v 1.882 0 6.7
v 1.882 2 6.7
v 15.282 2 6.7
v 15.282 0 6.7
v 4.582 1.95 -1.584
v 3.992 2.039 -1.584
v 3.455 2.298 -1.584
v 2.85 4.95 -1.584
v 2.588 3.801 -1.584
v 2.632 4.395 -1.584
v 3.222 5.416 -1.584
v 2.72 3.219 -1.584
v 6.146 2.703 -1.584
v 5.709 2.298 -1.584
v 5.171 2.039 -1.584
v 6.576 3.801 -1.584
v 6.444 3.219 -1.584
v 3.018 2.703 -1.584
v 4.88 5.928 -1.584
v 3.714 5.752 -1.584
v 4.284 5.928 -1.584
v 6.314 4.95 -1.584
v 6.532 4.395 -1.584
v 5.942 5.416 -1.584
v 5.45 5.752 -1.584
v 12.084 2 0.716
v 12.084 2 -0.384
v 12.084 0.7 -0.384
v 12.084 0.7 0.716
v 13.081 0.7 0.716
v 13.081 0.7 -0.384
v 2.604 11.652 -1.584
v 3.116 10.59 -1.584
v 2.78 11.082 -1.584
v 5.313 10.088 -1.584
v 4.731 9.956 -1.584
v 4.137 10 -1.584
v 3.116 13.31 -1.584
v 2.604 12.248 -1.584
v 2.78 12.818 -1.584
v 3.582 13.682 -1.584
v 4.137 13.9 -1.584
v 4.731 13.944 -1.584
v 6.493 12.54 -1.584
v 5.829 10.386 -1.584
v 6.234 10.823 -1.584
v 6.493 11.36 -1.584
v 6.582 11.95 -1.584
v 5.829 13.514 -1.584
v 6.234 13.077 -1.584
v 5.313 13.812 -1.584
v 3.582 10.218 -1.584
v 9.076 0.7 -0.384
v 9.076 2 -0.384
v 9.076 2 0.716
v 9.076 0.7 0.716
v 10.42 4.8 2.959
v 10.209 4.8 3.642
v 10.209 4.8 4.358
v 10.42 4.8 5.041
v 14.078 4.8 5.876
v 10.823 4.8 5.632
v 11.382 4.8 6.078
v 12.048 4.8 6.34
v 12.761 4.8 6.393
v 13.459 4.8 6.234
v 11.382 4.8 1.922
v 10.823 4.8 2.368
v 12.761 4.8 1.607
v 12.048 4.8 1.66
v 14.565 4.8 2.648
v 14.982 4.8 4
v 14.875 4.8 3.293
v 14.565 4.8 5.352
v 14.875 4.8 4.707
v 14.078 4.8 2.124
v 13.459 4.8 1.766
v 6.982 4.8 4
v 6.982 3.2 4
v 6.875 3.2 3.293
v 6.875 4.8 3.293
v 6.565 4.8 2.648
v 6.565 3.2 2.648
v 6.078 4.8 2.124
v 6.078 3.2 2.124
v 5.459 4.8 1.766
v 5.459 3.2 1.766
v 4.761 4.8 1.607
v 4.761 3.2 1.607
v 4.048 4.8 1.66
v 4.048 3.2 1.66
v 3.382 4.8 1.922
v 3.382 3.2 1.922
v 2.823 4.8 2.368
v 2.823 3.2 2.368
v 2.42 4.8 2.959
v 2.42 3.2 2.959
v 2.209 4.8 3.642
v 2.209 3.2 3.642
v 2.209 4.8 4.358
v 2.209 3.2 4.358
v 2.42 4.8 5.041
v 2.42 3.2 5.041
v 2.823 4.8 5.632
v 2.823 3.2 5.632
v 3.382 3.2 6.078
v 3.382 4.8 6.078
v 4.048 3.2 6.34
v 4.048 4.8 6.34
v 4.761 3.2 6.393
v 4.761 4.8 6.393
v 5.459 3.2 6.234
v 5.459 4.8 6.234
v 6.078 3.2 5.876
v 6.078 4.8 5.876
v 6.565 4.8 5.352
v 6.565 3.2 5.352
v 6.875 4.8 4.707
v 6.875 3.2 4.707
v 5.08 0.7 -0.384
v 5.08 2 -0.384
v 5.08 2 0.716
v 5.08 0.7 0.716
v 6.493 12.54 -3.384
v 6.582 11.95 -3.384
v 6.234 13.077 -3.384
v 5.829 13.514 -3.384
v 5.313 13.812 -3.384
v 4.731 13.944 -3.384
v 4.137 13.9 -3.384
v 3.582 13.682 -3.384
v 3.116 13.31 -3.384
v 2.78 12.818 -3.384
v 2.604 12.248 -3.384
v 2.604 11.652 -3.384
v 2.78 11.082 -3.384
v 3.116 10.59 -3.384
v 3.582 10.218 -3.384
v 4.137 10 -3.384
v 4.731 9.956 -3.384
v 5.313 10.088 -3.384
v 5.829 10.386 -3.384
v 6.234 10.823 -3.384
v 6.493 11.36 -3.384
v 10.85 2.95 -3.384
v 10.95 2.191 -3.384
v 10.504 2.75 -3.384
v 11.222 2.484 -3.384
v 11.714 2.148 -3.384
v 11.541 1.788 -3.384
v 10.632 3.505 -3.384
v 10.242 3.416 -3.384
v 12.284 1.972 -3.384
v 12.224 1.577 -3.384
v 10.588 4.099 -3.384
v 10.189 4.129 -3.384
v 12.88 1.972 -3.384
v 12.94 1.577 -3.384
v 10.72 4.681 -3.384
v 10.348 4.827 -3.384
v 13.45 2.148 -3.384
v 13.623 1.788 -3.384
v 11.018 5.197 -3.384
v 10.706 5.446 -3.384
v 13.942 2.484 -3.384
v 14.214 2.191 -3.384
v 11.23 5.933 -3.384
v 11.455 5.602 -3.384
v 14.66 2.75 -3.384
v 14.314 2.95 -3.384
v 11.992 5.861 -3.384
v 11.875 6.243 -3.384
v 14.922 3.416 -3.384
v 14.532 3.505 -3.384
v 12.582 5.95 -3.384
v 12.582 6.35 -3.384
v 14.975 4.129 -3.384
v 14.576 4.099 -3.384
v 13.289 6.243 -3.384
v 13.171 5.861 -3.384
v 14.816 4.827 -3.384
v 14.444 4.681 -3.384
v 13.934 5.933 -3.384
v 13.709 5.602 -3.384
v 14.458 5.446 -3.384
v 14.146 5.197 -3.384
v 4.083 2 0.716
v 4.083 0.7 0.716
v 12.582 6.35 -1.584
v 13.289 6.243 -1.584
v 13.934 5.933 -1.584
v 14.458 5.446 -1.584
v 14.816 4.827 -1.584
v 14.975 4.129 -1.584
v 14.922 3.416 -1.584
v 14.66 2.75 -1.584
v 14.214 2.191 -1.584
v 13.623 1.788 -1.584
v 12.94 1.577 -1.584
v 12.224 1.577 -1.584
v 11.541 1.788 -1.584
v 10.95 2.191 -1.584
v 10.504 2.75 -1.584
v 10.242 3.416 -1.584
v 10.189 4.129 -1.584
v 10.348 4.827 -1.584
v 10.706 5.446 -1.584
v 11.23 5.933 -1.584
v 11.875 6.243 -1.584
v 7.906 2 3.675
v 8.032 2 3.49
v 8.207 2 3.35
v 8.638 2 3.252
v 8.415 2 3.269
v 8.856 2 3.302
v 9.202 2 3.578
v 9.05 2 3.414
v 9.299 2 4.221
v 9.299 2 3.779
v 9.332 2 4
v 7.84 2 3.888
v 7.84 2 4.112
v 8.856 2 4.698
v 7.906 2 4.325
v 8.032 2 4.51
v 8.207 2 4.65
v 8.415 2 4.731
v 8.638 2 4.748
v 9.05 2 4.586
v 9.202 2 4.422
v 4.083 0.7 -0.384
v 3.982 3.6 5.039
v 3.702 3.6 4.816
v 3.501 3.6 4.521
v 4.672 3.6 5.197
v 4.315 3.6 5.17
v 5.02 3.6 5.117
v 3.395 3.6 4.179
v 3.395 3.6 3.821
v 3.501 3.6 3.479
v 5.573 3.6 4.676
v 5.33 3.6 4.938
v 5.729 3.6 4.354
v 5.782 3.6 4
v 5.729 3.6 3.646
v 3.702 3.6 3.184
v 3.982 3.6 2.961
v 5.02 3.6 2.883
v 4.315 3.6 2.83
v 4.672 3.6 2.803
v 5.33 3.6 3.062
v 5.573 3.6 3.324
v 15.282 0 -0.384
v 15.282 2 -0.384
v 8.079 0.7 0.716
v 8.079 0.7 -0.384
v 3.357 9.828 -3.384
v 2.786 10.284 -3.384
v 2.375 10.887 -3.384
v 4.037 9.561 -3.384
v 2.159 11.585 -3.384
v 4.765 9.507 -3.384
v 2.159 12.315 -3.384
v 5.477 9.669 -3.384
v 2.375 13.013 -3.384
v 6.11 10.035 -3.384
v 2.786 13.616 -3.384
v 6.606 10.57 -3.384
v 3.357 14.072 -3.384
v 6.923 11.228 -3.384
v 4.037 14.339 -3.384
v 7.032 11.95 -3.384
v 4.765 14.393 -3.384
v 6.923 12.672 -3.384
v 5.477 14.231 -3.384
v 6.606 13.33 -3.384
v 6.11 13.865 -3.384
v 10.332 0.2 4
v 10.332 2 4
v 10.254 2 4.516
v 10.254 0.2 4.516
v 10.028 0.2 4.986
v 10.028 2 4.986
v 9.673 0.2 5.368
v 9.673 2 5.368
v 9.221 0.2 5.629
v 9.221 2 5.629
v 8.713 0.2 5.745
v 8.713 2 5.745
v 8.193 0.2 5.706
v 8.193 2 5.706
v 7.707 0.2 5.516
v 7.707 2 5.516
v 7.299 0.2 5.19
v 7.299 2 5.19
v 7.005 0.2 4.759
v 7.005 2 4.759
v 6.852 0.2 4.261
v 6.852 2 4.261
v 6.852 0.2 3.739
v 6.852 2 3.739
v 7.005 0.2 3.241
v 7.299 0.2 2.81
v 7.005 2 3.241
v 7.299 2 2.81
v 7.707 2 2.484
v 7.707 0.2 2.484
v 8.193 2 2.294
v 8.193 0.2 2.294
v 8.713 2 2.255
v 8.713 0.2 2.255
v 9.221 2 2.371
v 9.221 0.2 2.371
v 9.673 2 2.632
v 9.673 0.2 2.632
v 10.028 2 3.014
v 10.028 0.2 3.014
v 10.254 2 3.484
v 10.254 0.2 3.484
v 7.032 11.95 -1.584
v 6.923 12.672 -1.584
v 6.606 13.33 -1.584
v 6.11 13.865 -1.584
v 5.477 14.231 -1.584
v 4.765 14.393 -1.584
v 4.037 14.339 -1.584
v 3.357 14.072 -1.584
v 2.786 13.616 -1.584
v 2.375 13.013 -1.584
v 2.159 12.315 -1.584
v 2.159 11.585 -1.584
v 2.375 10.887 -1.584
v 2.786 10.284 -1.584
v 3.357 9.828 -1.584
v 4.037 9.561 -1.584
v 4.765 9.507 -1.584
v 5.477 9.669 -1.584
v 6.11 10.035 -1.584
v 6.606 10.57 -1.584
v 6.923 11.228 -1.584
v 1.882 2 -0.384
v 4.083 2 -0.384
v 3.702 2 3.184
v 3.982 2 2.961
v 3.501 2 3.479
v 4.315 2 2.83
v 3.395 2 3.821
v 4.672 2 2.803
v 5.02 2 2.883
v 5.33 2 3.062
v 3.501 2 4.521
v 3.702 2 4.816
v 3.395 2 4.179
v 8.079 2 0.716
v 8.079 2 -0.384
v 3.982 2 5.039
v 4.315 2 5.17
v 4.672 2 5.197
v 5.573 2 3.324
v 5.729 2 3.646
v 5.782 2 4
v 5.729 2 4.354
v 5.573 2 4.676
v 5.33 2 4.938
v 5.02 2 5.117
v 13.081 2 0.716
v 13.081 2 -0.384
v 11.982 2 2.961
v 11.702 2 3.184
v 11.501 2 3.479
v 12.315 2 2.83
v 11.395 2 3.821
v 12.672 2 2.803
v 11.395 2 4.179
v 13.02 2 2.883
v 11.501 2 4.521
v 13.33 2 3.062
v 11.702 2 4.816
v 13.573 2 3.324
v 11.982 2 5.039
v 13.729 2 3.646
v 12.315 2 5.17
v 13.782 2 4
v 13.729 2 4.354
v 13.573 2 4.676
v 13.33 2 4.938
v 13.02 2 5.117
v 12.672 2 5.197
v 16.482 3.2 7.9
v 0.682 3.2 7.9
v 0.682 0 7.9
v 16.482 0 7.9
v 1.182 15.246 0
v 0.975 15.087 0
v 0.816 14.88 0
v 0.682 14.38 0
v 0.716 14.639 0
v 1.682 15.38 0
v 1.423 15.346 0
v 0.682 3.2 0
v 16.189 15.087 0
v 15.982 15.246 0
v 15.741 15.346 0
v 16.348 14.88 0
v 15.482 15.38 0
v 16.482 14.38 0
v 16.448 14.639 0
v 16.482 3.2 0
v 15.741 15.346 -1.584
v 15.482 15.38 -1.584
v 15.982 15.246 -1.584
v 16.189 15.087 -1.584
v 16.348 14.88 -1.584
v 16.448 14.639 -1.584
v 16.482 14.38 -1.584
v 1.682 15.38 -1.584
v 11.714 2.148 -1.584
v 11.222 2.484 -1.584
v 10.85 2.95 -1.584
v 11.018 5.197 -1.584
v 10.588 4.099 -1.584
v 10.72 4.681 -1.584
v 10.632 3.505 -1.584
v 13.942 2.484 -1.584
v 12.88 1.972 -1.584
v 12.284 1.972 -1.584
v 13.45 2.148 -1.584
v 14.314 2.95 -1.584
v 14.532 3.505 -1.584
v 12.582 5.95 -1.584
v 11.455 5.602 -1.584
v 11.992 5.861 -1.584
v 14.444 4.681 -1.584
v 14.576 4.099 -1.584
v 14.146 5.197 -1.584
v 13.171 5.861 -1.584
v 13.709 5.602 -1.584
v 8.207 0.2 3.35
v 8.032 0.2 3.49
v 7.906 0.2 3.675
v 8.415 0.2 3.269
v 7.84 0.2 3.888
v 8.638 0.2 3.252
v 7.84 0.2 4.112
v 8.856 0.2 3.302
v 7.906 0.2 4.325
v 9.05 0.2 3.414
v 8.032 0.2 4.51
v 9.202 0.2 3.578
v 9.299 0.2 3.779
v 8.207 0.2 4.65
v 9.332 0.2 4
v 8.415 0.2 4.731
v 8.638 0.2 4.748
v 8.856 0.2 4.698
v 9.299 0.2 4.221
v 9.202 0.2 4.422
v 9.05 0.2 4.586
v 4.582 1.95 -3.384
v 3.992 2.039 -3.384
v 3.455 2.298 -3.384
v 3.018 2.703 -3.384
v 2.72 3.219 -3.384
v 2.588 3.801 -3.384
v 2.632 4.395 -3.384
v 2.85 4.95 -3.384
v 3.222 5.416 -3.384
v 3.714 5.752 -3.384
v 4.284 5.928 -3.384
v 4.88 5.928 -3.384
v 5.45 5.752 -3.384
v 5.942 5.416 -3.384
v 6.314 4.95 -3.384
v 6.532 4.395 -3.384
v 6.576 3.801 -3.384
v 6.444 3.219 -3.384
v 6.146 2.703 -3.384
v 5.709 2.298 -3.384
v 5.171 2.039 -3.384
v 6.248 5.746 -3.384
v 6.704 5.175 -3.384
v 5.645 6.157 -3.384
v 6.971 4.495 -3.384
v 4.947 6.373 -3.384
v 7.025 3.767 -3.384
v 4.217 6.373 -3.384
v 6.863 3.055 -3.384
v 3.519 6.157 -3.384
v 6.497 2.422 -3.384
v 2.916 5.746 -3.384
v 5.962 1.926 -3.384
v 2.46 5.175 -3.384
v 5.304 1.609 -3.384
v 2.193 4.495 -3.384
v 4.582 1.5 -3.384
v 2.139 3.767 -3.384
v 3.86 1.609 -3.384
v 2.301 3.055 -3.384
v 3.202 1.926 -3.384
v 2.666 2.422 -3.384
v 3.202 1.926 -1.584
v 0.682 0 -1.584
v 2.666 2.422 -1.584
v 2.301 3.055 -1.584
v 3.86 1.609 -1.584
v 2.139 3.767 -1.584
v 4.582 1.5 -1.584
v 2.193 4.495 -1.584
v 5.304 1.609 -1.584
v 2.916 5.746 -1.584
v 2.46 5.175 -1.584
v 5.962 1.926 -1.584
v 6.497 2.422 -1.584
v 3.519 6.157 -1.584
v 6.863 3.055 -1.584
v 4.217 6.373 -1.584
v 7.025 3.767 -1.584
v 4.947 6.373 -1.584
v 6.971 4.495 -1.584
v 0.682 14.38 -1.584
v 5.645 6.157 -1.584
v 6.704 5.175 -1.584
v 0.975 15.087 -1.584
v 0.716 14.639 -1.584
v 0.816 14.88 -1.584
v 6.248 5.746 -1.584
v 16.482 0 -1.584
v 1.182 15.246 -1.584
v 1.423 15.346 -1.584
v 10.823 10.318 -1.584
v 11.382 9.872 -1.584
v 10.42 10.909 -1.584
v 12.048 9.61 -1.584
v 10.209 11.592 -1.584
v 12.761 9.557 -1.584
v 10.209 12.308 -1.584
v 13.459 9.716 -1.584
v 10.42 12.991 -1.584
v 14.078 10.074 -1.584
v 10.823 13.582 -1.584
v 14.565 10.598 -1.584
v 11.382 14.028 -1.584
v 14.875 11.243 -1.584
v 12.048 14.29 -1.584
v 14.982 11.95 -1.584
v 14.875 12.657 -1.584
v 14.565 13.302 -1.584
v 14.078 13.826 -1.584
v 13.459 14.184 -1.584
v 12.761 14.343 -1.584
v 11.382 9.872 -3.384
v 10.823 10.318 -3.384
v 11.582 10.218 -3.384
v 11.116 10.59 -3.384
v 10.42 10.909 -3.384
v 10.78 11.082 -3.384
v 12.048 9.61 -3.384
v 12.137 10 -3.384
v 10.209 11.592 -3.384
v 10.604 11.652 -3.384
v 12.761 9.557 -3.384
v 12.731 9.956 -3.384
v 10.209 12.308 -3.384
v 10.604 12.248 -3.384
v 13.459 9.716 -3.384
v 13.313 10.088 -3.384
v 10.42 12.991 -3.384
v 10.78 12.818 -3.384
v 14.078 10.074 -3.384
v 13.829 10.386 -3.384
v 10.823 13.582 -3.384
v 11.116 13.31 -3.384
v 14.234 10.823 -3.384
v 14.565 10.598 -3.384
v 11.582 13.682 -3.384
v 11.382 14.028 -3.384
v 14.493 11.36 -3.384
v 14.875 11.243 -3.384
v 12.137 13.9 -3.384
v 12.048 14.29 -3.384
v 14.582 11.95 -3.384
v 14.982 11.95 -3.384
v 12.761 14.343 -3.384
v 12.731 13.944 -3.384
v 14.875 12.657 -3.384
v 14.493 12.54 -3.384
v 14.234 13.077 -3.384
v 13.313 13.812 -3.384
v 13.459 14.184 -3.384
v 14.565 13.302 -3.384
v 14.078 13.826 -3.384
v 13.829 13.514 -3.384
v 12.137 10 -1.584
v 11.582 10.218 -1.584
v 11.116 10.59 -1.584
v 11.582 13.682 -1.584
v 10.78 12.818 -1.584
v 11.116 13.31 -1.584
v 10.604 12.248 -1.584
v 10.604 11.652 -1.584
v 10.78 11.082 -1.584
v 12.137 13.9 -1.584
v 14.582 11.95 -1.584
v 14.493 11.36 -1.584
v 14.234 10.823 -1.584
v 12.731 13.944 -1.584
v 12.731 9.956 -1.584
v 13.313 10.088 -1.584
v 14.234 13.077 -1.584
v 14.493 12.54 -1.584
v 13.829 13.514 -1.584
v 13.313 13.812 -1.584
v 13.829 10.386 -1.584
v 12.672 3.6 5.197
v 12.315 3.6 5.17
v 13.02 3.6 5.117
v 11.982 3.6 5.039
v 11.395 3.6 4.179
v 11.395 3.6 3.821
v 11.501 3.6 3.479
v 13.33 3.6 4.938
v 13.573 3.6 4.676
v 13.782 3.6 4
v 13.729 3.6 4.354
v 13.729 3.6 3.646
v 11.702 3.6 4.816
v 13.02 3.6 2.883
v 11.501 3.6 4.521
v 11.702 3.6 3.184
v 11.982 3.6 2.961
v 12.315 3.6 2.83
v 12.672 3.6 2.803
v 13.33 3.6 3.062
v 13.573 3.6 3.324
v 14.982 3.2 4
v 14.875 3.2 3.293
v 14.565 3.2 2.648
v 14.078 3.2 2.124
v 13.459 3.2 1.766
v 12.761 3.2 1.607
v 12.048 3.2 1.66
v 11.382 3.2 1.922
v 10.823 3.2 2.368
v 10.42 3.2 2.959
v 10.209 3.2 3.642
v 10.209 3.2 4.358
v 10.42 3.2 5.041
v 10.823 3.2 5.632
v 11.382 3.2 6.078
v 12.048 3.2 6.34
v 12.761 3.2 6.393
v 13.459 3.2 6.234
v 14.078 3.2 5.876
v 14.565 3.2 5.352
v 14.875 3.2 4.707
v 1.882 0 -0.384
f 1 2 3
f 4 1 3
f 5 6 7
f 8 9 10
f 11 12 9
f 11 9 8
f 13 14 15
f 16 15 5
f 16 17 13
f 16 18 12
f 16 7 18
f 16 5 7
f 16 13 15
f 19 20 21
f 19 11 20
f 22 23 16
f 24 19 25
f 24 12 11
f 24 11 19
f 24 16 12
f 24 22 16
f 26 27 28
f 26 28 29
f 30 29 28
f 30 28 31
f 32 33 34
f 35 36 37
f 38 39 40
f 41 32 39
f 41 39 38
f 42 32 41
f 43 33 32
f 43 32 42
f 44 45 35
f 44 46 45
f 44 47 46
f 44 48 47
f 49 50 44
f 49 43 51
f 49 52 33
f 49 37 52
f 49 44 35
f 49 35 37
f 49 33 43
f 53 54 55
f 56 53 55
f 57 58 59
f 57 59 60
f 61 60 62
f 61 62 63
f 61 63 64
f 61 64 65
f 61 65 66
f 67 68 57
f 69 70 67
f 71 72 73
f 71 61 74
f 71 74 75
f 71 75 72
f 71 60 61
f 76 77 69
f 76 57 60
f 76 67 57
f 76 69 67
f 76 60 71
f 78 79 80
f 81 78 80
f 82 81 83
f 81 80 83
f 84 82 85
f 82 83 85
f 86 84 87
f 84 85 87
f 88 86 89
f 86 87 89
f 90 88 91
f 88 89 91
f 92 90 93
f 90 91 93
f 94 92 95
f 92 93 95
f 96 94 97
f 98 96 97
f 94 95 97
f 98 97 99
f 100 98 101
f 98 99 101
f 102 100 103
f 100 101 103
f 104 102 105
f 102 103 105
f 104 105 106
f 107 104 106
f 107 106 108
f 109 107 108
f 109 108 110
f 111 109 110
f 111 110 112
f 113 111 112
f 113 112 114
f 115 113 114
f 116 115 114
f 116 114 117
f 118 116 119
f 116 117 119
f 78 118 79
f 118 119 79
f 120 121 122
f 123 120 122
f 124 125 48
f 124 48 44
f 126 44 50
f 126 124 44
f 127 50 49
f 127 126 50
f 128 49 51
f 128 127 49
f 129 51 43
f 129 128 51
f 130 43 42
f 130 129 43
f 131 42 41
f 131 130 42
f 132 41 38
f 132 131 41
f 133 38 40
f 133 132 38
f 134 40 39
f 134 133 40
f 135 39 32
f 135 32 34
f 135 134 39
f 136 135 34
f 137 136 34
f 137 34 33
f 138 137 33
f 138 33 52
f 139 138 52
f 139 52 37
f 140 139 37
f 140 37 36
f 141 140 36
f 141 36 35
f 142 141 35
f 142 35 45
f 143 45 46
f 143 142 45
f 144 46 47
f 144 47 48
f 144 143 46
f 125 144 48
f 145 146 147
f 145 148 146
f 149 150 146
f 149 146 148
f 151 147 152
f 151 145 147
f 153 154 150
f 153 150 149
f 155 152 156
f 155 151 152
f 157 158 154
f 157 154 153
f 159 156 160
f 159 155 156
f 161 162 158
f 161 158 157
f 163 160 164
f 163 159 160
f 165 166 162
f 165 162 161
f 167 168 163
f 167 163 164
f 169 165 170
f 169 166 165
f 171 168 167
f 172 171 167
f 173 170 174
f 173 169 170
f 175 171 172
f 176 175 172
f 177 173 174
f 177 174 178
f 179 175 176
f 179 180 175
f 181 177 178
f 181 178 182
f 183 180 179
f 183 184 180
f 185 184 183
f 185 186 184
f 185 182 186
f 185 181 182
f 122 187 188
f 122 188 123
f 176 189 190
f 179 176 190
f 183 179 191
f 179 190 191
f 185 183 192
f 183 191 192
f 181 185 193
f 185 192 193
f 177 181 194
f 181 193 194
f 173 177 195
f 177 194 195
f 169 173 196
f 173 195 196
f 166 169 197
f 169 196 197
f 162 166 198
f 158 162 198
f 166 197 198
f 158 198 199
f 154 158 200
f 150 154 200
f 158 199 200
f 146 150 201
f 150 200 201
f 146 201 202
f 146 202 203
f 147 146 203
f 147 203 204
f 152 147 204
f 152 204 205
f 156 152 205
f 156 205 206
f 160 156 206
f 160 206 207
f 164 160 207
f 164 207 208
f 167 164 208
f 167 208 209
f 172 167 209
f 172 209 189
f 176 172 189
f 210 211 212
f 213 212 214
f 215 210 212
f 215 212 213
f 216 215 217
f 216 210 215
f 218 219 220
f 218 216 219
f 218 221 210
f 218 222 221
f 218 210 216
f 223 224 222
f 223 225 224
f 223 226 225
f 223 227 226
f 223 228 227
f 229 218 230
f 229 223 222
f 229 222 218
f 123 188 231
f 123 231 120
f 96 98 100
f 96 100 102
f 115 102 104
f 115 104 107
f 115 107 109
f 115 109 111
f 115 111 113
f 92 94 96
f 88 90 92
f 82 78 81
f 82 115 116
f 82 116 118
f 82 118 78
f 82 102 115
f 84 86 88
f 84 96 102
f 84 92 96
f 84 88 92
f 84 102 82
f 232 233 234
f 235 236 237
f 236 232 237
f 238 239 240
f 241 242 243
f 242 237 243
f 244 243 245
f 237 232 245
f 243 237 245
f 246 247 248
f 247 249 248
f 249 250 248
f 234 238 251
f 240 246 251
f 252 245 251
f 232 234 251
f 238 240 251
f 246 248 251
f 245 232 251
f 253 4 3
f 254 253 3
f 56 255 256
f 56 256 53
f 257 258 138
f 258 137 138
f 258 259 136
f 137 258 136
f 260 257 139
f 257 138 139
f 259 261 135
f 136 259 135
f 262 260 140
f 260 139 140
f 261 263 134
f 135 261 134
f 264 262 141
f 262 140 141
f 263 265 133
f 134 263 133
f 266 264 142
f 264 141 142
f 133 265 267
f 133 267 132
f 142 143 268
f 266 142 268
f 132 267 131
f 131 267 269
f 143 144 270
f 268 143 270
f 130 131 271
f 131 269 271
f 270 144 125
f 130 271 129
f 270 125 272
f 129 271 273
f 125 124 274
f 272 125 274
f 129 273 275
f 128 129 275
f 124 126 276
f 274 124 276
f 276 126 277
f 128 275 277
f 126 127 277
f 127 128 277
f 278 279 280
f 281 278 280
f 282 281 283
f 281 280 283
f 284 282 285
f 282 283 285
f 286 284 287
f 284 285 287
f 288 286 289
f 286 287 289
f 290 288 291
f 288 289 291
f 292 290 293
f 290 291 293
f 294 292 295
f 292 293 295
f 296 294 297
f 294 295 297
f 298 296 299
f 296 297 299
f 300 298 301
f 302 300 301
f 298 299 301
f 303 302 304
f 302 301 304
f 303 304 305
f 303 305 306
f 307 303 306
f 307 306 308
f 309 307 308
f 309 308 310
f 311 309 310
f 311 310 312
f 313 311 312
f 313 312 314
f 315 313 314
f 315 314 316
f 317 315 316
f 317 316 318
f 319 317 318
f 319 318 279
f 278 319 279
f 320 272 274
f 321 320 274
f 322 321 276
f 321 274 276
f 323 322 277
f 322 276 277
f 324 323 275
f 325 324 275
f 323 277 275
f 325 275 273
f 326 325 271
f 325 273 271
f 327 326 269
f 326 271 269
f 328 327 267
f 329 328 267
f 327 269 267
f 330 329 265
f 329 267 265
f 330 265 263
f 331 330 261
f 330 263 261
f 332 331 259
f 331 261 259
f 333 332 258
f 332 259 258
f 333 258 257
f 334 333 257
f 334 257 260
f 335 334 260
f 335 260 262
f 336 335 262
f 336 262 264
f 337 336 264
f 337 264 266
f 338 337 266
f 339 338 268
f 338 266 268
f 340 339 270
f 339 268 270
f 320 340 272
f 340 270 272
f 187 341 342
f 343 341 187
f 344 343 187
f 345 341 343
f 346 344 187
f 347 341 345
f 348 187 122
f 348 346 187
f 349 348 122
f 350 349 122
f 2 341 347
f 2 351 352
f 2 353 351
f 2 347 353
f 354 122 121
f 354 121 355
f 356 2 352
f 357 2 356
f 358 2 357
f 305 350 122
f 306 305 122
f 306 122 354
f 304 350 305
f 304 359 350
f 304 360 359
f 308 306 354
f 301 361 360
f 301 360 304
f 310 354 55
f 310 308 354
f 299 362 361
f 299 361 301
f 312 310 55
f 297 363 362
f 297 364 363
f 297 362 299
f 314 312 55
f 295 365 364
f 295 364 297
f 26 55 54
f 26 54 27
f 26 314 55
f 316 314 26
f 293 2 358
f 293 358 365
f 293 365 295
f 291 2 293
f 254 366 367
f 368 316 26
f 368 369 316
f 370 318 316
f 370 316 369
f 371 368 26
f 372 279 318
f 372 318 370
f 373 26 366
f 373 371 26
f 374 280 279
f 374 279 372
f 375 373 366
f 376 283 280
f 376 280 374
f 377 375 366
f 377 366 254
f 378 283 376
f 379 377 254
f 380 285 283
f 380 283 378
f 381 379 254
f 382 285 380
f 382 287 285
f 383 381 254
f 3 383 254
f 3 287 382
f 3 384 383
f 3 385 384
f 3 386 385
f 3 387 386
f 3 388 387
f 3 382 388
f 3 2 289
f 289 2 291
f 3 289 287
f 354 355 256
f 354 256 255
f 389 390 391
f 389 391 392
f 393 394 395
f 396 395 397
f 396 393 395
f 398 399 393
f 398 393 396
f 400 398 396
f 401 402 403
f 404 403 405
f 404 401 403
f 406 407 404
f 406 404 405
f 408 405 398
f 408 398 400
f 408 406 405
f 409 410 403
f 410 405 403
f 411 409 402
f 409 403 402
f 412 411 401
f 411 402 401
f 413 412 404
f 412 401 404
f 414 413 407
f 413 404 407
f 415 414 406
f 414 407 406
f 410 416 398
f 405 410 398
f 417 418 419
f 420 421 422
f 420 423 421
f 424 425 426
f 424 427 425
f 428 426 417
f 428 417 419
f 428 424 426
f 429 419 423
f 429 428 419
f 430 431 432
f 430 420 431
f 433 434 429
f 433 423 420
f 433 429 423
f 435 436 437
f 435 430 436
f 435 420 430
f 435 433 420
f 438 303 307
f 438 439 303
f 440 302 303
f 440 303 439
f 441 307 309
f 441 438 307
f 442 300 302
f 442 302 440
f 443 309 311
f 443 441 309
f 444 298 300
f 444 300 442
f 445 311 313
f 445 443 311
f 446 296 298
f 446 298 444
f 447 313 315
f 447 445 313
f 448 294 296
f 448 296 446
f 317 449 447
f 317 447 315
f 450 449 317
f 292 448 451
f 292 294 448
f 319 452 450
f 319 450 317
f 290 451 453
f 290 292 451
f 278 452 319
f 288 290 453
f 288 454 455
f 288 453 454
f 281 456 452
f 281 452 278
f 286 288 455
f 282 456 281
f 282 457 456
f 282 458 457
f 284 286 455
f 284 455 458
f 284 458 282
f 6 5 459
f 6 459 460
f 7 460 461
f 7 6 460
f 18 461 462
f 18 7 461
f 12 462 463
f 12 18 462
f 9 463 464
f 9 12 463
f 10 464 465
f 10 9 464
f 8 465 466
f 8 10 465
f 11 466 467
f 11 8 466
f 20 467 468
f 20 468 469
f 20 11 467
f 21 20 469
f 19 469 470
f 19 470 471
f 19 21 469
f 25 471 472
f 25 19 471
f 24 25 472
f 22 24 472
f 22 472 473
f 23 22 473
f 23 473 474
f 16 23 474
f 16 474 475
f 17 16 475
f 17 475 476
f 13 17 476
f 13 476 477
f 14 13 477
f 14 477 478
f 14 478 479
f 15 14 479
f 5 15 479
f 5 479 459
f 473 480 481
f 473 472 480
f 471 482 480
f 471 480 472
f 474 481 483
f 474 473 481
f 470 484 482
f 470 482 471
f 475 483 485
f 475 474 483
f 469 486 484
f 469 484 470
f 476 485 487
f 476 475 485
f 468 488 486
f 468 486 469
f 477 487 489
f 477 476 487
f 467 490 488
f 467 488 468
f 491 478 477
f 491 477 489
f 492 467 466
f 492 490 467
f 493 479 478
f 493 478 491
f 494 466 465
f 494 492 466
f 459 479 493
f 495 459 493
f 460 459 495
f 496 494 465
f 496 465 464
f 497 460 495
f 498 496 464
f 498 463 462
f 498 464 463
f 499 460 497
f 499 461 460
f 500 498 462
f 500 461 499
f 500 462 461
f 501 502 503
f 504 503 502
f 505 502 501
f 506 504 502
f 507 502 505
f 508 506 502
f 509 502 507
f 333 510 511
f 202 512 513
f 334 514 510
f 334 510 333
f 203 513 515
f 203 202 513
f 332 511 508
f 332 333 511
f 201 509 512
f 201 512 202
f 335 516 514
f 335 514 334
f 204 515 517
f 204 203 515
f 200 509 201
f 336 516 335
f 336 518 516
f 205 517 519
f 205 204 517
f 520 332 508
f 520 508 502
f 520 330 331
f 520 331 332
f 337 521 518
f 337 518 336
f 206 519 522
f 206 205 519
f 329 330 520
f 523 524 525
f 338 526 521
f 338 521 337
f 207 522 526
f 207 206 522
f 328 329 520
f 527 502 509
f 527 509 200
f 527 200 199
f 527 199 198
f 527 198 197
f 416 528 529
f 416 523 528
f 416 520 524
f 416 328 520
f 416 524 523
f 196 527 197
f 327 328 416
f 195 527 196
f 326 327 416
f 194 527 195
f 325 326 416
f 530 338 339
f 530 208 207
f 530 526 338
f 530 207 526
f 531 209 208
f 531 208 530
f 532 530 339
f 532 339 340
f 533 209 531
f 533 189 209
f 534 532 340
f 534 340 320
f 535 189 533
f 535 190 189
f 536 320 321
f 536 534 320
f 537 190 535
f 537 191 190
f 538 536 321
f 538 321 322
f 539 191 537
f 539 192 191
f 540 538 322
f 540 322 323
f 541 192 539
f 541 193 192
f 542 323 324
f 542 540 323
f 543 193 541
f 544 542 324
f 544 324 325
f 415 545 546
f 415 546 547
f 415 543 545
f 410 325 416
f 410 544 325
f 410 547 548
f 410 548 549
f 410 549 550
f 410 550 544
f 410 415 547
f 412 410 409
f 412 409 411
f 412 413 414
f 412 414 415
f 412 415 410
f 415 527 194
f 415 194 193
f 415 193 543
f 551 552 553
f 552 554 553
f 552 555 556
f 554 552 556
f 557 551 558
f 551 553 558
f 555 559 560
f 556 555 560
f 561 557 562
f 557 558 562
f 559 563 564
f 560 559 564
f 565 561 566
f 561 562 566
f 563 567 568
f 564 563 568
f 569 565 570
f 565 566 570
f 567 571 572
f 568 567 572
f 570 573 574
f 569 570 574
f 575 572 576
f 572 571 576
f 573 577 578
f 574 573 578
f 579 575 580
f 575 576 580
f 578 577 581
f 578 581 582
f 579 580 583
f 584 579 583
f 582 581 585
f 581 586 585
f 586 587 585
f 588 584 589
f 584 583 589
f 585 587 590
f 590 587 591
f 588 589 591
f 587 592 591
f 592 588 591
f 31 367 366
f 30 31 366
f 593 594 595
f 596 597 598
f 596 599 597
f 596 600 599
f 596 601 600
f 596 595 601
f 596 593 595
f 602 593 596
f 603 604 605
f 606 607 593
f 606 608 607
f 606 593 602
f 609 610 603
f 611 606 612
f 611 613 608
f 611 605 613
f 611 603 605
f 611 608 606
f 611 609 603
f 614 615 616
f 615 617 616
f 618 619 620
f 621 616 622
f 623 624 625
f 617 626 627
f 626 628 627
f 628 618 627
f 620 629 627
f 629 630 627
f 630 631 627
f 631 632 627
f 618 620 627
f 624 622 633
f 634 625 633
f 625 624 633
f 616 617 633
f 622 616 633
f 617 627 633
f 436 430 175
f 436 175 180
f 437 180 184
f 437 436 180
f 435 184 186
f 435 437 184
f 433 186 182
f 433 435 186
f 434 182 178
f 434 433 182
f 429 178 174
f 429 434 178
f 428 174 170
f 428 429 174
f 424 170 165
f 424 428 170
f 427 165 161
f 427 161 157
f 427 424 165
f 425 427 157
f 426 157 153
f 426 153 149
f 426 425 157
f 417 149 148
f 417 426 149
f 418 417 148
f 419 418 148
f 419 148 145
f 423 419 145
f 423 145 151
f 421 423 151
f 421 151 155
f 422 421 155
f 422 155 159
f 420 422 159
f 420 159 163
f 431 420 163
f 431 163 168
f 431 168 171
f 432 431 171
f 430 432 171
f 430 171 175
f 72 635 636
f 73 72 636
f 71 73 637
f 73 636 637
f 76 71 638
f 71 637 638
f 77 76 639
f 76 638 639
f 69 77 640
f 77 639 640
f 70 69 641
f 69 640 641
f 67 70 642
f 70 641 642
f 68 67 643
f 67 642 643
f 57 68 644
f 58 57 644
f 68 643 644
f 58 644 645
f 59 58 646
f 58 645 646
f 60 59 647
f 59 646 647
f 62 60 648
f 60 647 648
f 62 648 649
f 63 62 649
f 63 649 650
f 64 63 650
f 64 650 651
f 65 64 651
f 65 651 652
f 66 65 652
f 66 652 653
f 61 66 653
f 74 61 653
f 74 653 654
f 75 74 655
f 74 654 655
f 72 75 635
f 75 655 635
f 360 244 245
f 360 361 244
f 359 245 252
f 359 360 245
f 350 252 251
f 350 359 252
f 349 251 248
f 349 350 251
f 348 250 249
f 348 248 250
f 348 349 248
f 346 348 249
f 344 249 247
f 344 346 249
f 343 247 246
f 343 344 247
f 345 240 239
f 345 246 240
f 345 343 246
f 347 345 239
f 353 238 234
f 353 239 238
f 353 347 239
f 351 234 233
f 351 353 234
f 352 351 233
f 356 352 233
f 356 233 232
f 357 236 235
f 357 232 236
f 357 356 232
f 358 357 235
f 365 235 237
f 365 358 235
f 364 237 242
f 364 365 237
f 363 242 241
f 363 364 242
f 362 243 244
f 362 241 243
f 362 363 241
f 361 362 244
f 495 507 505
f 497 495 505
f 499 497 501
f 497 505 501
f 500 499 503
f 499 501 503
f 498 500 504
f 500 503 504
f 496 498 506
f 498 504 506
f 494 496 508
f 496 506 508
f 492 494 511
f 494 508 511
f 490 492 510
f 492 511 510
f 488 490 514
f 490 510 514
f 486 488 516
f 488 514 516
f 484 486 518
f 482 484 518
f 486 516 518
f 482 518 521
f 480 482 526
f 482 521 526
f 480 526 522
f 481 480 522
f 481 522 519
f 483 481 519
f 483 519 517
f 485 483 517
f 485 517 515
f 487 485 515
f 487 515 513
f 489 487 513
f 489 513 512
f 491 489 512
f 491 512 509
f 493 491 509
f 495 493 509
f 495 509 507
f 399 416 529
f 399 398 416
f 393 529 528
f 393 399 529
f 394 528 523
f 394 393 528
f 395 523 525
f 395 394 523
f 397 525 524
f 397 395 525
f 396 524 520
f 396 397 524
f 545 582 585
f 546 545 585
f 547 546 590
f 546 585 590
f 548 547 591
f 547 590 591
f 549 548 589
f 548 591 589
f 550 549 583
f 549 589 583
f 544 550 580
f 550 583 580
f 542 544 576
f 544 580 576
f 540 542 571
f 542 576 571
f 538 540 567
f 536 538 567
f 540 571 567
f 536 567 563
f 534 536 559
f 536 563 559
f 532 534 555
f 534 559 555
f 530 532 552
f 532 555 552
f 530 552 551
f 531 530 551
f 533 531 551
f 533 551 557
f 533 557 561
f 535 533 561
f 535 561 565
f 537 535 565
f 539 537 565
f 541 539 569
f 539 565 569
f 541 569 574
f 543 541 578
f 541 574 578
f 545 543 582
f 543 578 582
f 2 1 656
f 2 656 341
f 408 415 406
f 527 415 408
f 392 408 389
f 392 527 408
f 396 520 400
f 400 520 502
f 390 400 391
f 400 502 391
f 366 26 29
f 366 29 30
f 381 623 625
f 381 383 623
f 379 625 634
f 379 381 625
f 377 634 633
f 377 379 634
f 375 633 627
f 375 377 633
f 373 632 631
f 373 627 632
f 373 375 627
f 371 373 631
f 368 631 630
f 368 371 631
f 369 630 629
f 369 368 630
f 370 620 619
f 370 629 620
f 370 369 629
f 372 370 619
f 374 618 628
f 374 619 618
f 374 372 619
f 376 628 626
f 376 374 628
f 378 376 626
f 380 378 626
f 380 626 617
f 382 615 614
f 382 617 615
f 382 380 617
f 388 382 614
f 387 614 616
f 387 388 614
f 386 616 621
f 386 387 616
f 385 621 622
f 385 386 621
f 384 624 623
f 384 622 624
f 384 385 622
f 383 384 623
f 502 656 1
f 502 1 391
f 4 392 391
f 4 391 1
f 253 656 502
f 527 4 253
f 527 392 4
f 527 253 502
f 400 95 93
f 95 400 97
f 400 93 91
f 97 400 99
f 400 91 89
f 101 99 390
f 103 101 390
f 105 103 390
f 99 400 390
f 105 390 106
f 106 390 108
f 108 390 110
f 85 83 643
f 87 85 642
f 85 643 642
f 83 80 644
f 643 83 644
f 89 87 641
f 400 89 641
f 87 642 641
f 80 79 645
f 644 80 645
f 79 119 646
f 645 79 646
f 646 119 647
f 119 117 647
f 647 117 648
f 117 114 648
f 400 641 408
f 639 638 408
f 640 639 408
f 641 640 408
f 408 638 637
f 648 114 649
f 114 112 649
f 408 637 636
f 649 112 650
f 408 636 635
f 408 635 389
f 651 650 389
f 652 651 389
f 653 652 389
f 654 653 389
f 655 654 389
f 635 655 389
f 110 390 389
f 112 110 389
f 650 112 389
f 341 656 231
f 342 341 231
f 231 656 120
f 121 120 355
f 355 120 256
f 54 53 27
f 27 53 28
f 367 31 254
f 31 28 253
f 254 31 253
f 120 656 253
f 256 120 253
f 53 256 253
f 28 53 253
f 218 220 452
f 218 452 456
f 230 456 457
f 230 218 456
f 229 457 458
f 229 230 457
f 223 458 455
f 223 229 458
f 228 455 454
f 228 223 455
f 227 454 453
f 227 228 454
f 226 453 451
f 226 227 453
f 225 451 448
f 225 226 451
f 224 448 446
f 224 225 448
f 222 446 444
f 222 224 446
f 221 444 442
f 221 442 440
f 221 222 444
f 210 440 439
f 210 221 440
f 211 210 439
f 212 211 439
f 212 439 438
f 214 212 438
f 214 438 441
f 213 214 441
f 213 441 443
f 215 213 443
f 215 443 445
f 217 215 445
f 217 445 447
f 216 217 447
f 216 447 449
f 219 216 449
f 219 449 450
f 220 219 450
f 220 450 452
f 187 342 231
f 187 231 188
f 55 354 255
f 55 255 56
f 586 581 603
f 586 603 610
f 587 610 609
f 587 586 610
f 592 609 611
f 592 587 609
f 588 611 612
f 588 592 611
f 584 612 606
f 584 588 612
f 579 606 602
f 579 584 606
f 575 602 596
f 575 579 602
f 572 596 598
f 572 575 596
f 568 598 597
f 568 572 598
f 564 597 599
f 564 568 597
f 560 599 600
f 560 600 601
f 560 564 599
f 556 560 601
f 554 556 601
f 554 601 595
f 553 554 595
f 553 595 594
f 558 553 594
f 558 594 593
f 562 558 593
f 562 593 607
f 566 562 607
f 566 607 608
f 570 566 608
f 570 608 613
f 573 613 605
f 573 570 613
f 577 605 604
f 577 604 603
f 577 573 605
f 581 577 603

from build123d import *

# Parameters (mm, degrees)
MAINBASESKETCH_W                       = 15.8
MAINBASESKETCH_H                       = 3.2
MAINBASEEXTRUDE_DEPTH                  = 7.9
STUDSSKETCH_R                          = 2.4
STUDSEXTRUDE_DEPTH                     = 1.6
STUDSPATTERN_COUNT                     = 2
STUDSPATTERN_PITCH                     = 8
STUDSPATTERN_COUNT_DIR2                = 2
STUDSPATTERN_PITCH_DIR2                = 8
MAINBASESHELL_T                        = -1.2
LCUTBLUE_DEPTH                         = 19.555463972
LCUTBLUE_DEPTH_BACK                    = 19.555463972
CUTADDEDTOLCUT_DEPTH                   = 2
MADESLIMCUTSKETCH_W                    = 7.9
MADESLIMCUTSKETCH_H                    = 7.9
MADESLIMCUT_DEPTH                      = 19.897228453
MADESLIMFILLEXT_REACH                  = 20.897
SKETCH33_W                             = 5.500952983
SKETCH33_H                             = 1.199047018
SLIMHOLEEXT_START                      = -0.2
SLIMHOLESKETCH_R                       = 1.75
SLIMHOLESKETCH_R_2                     = 0.75
SLIMHOLEEXT_DEPTH                      = 2
SHORTLEXTENSIONSKETCH_W                = 1.583745828
SHORTLEXTENSIONSKETCH_H                = 7.9
SHORTLEXTENDEDCUTSKETCH_W              = 13.4
SHORTLEXTENDEDCUTSKETCH_H              = 1.582792846
SHORTLEXTENDEDCUT_DEPTH                = 2
SHORTLUNDERSTUMPS_START                = -0.2
SHORTLUNDERSTUMPSKETCH_W               = 0.996828098
SHORTLUNDERSTUMPSKETCH_H               = 1.1
SHORTLUNDERSTUMPS_DEPTH                = 1.5
SHORTLUPPERCIRCLES_START               = -0.2
SHORTLUPPERCIRCLESSKETCH_R             = 2.4
SHORTLUPPERCIRCLESSKETCH_R_2           = 2
SHORTLUPPERCIRCLESSKETCH_R_3           = 2.45
SHORTLUPPERCIRCLES_DEPTH               = 2
TALLERLBASEEXTENSIONSKETCH_W           = 1.583745828
TALLERLBASEEXTENSIONSKETCH_H           = 7.48
F_4UPPERCIRCLESTALLERLBASE_START       = -3.383745828
F_4UPPERCIRCLESTALLERLBASE_OUTLINE_R   = 2.45
F_4UPPERCIRCLESTALLERLBASE_OUTLINE_R_2 = 2
F_4UPPERCIRCLESTALLERLBASE_OUTLINE_R_3 = 2.4
F_4UPPERCIRCLESTALLERLBASE_DEPTH       = 1.8
TALLERLBASEOUTERCHAMFER_R              = 1


# Read off the part's stored shape, not the designer's step: 4UpperCirclesTallerLBase
with BuildPart() as part:
    # MainBaseSketch → MainBaseExtrude (new, symmetric)
    with BuildSketch(Plane.XY):
        with Locations((8.581967213, 1.6)):
            Rectangle(MAINBASESKETCH_W, MAINBASESKETCH_H)
    extrude(amount=MAINBASEEXTRUDE_DEPTH, both=True)

    # StudsSketch → StudsExtrude (add)
    with BuildSketch(Plane(origin=(0, 3.2, 0), x_dir=(1, 0, 0), z_dir=(0, 1, 0))):
        with Locations((4.581967213, 4)):
            Circle(STUDSSKETCH_R)
    studsextrude = extrude(amount=STUDSEXTRUDE_DEPTH)

    # StudsPattern: StudsExtrude 2 × 2
    with Locations(*[(j * STUDSPATTERN_PITCH_DIR2, 0, i * STUDSPATTERN_PITCH) for i in range(STUDSPATTERN_COUNT) for j in range(STUDSPATTERN_COUNT_DIR2) if (i, j) != (0, 0)]):
        add(studsextrude)

    # MainBaseShell
    mainbaseshell_openings = [part.faces().sort_by_distance(p)[0] for p in [
        (8.581967213, 0, 0),
    ]]
    offset(amount=MAINBASESHELL_T, openings=mainbaseshell_openings, kind=Kind.INTERSECTION)

    # LCUTBlueSketch → LCutBlue (cut, two sides: drawn at the far end of the back side and taken through both)
    with BuildSketch(Plane(origin=(0, 3.2, 0), x_dir=(1, 0, 0), z_dir=(0, 1, 0)).offset(-LCUTBLUE_DEPTH_BACK)):
        Polygon((8.581967213, 53.229874044), (8.581967213, 7.9), (8.581967213, 0), (16.481967213, 0), (61.811841258, 0), (125.917963912, 64.106122654), (72.688089868, 117.335996699), align=None)
    extrude(amount=LCUTBLUE_DEPTH + LCUTBLUE_DEPTH_BACK, mode=Mode.SUBTRACT)

    # CutAddedtoLSketch → CutAddedToLCut (add)
    with BuildSketch(Plane.XZ):
        Polygon((7.382920196, -6.7), (8.581967213, -6.7), (8.581967213, 0), (15.281967213, 0), (15.281967213, 1.199047018), (7.382920196, 1.199047018), (7.382920196, 0), align=None)
    extrude(amount=-CUTADDEDTOLCUT_DEPTH)

    # MadeSlimCutSketch → MadeSlimCut (cut, through all)
    with BuildSketch(Plane.XZ):
        with Locations((4.631967213, -3.95)):
            Rectangle(MADESLIMCUTSKETCH_W, MADESLIMCUTSKETCH_H)
    extrude(amount=-MADESLIMCUT_DEPTH, mode=Mode.SUBTRACT)

    # Sketch33 → MadeSlimFillExt (add, up to next)
    with BuildSketch(Plane.XZ, mode=Mode.PRIVATE) as madeslimfillext_sk1:
        with Locations((4.632443704, 0.599523509)):
            Rectangle(SKETCH33_W, SKETCH33_H)
    madeslimfillext_tool1 = extrude(madeslimfillext_sk1.sketch, amount=-MADESLIMFILLEXT_REACH, mode=Mode.PRIVATE) - part.part
    add(madeslimfillext_tool1.solids().sort_by_distance((4.632444, 0, 0.599524))[0])

    # SlimHoleSketch → SlimHoleExt (add)
    with BuildSketch(Plane.XZ.offset(-2).offset(SLIMHOLEEXT_START)):
        with Locations((8.581967213, 4)):
            Circle(SLIMHOLESKETCH_R)
        with Locations((8.581967213, 4)):
            Circle(SLIMHOLESKETCH_R_2, mode=Mode.SUBTRACT)
    extrude(amount=SLIMHOLEEXT_DEPTH)

    # ShortLExtension: sweep along a curve in space
    with BuildLine() as shortlextension_path:
        Line((0.681967213, 3.2, 0), (16.481967213, 3.2, 0))
    # ShortLExtensionSketch → ShortLExtension (sweep)
    with BuildSketch(Plane(origin=(16.481967213, 0, 0), x_dir=(0, 0, -1), z_dir=(1, 0, 0))):
        with Locations((0.791872914, 3.95)):
            Rectangle(SHORTLEXTENSIONSKETCH_W, SHORTLEXTENSIONSKETCH_H)
    sweep(path=shortlextension_path.line)

    # ShortLExtendedCutSketch → ShortLExtendedCut (cut)
    with BuildSketch(Plane.XZ):
        with Locations((8.581967213, 0.407650595)):
            Rectangle(SHORTLEXTENDEDCUTSKETCH_W, SHORTLEXTENDEDCUTSKETCH_H)
    extrude(amount=-SHORTLEXTENDEDCUT_DEPTH, mode=Mode.SUBTRACT)

    # ShortLUnderStumpSketch → ShortLUnderStumps (add)
    with BuildSketch(Plane.XZ.offset(-2).offset(SHORTLUNDERSTUMPS_START)):
        with Locations((4.581764801, 0.166254172)):
            Rectangle(SHORTLUNDERSTUMPSKETCH_W, SHORTLUNDERSTUMPSKETCH_H)
        with Locations((8.57767054, 0.166254172)):
            Rectangle(SHORTLUNDERSTUMPSKETCH_W, SHORTLUNDERSTUMPSKETCH_H)
        with Locations((12.582169625, 0.166254172)):
            Rectangle(SHORTLUNDERSTUMPSKETCH_W, SHORTLUNDERSTUMPSKETCH_H)
    extrude(amount=SHORTLUNDERSTUMPS_DEPTH)

    # ShortLUpperCirclesSketch → ShortLUpperCircles (add)
    # profile 1 of 2: a face of its own
    with BuildSketch(Plane(origin=(0, 0, -1.583745828), x_dir=(-1, 0, 0), z_dir=(0, 0, -1)).offset(SHORTLUPPERCIRCLES_START)):
        with Locations(Location((-12.581967213, 3.95, 0), (0, 0, 90))):
            Circle(SHORTLUPPERCIRCLESSKETCH_R)
        with Locations(Location((-12.581967213, 3.95, 0), (0, 0, 90))):
            Circle(SHORTLUPPERCIRCLESSKETCH_R_2, mode=Mode.SUBTRACT)
    # profile 2 of 2: a face of its own
    with BuildSketch(Plane(origin=(0, 0, -1.583745828), x_dir=(-1, 0, 0), z_dir=(0, 0, -1)).offset(SHORTLUPPERCIRCLES_START)):
        with Locations(Location((-4.581967213, 3.95, 0), (0, 0, 270))):
            Circle(SHORTLUPPERCIRCLESSKETCH_R_3)
        with Locations(Location((-4.581967213, 3.95, 0), (0, 0, 270))):
            Circle(SHORTLUPPERCIRCLESSKETCH_R_2, mode=Mode.SUBTRACT)
    extrude(amount=SHORTLUPPERCIRCLES_DEPTH)

    # TallerLBaseExtension: sweep along a curve in space
    with BuildLine() as tallerlbaseextension_path:
        Line((0.681967213, 7.9, -1.583745828), (16.481967213, 7.9, -1.583745828))
    # TallerLBaseExtensionSketch → TallerLBaseExtension (sweep)
    with BuildSketch(Plane(origin=(16.481967213, 0, 0), x_dir=(0, 0, -1), z_dir=(1, 0, 0))):
        with Locations((0.791872914, 11.64)):
            Rectangle(TALLERLBASEEXTENSIONSKETCH_W, TALLERLBASEEXTENSIONSKETCH_H)
    sweep(path=tallerlbaseextension_path.line)

    # 4UpperCirclesTallerLBase outline → 4UpperCirclesTallerLBase (add)
    # profile 1 of 2: a face of its own
    with BuildSketch(Plane.XY.offset(F_4UPPERCIRCLESTALLERLBASE_START)):
        with Locations((4.581967213, 11.95)):
            Circle(F_4UPPERCIRCLESTALLERLBASE_OUTLINE_R)
        with Locations((4.581967213, 11.95)):
            Circle(F_4UPPERCIRCLESTALLERLBASE_OUTLINE_R_2, mode=Mode.SUBTRACT)
    # profile 2 of 2: a face of its own
    with BuildSketch(Plane.XY.offset(F_4UPPERCIRCLESTALLERLBASE_START)):
        with Locations((12.581967213, 11.95)):
            Circle(F_4UPPERCIRCLESTALLERLBASE_OUTLINE_R_3)
        with Locations((12.581967213, 11.95)):
            Circle(F_4UPPERCIRCLESTALLERLBASE_OUTLINE_R_2, mode=Mode.SUBTRACT)
    extrude(amount=F_4UPPERCIRCLESTALLERLBASE_DEPTH)

    # TallerLBaseOuterChamfer
    tallerlbaseouterchamfer_edges = [part.edges().sort_by_distance(p)[0] for p in [
        (16.481967213, 15.38, -0.791872914),
        (0.681967213, 15.38, -0.791872914),
    ]]
    fillet(tallerlbaseouterchamfer_edges, radius=TALLERLBASEOUTERCHAMFER_R)


solid = part.part
